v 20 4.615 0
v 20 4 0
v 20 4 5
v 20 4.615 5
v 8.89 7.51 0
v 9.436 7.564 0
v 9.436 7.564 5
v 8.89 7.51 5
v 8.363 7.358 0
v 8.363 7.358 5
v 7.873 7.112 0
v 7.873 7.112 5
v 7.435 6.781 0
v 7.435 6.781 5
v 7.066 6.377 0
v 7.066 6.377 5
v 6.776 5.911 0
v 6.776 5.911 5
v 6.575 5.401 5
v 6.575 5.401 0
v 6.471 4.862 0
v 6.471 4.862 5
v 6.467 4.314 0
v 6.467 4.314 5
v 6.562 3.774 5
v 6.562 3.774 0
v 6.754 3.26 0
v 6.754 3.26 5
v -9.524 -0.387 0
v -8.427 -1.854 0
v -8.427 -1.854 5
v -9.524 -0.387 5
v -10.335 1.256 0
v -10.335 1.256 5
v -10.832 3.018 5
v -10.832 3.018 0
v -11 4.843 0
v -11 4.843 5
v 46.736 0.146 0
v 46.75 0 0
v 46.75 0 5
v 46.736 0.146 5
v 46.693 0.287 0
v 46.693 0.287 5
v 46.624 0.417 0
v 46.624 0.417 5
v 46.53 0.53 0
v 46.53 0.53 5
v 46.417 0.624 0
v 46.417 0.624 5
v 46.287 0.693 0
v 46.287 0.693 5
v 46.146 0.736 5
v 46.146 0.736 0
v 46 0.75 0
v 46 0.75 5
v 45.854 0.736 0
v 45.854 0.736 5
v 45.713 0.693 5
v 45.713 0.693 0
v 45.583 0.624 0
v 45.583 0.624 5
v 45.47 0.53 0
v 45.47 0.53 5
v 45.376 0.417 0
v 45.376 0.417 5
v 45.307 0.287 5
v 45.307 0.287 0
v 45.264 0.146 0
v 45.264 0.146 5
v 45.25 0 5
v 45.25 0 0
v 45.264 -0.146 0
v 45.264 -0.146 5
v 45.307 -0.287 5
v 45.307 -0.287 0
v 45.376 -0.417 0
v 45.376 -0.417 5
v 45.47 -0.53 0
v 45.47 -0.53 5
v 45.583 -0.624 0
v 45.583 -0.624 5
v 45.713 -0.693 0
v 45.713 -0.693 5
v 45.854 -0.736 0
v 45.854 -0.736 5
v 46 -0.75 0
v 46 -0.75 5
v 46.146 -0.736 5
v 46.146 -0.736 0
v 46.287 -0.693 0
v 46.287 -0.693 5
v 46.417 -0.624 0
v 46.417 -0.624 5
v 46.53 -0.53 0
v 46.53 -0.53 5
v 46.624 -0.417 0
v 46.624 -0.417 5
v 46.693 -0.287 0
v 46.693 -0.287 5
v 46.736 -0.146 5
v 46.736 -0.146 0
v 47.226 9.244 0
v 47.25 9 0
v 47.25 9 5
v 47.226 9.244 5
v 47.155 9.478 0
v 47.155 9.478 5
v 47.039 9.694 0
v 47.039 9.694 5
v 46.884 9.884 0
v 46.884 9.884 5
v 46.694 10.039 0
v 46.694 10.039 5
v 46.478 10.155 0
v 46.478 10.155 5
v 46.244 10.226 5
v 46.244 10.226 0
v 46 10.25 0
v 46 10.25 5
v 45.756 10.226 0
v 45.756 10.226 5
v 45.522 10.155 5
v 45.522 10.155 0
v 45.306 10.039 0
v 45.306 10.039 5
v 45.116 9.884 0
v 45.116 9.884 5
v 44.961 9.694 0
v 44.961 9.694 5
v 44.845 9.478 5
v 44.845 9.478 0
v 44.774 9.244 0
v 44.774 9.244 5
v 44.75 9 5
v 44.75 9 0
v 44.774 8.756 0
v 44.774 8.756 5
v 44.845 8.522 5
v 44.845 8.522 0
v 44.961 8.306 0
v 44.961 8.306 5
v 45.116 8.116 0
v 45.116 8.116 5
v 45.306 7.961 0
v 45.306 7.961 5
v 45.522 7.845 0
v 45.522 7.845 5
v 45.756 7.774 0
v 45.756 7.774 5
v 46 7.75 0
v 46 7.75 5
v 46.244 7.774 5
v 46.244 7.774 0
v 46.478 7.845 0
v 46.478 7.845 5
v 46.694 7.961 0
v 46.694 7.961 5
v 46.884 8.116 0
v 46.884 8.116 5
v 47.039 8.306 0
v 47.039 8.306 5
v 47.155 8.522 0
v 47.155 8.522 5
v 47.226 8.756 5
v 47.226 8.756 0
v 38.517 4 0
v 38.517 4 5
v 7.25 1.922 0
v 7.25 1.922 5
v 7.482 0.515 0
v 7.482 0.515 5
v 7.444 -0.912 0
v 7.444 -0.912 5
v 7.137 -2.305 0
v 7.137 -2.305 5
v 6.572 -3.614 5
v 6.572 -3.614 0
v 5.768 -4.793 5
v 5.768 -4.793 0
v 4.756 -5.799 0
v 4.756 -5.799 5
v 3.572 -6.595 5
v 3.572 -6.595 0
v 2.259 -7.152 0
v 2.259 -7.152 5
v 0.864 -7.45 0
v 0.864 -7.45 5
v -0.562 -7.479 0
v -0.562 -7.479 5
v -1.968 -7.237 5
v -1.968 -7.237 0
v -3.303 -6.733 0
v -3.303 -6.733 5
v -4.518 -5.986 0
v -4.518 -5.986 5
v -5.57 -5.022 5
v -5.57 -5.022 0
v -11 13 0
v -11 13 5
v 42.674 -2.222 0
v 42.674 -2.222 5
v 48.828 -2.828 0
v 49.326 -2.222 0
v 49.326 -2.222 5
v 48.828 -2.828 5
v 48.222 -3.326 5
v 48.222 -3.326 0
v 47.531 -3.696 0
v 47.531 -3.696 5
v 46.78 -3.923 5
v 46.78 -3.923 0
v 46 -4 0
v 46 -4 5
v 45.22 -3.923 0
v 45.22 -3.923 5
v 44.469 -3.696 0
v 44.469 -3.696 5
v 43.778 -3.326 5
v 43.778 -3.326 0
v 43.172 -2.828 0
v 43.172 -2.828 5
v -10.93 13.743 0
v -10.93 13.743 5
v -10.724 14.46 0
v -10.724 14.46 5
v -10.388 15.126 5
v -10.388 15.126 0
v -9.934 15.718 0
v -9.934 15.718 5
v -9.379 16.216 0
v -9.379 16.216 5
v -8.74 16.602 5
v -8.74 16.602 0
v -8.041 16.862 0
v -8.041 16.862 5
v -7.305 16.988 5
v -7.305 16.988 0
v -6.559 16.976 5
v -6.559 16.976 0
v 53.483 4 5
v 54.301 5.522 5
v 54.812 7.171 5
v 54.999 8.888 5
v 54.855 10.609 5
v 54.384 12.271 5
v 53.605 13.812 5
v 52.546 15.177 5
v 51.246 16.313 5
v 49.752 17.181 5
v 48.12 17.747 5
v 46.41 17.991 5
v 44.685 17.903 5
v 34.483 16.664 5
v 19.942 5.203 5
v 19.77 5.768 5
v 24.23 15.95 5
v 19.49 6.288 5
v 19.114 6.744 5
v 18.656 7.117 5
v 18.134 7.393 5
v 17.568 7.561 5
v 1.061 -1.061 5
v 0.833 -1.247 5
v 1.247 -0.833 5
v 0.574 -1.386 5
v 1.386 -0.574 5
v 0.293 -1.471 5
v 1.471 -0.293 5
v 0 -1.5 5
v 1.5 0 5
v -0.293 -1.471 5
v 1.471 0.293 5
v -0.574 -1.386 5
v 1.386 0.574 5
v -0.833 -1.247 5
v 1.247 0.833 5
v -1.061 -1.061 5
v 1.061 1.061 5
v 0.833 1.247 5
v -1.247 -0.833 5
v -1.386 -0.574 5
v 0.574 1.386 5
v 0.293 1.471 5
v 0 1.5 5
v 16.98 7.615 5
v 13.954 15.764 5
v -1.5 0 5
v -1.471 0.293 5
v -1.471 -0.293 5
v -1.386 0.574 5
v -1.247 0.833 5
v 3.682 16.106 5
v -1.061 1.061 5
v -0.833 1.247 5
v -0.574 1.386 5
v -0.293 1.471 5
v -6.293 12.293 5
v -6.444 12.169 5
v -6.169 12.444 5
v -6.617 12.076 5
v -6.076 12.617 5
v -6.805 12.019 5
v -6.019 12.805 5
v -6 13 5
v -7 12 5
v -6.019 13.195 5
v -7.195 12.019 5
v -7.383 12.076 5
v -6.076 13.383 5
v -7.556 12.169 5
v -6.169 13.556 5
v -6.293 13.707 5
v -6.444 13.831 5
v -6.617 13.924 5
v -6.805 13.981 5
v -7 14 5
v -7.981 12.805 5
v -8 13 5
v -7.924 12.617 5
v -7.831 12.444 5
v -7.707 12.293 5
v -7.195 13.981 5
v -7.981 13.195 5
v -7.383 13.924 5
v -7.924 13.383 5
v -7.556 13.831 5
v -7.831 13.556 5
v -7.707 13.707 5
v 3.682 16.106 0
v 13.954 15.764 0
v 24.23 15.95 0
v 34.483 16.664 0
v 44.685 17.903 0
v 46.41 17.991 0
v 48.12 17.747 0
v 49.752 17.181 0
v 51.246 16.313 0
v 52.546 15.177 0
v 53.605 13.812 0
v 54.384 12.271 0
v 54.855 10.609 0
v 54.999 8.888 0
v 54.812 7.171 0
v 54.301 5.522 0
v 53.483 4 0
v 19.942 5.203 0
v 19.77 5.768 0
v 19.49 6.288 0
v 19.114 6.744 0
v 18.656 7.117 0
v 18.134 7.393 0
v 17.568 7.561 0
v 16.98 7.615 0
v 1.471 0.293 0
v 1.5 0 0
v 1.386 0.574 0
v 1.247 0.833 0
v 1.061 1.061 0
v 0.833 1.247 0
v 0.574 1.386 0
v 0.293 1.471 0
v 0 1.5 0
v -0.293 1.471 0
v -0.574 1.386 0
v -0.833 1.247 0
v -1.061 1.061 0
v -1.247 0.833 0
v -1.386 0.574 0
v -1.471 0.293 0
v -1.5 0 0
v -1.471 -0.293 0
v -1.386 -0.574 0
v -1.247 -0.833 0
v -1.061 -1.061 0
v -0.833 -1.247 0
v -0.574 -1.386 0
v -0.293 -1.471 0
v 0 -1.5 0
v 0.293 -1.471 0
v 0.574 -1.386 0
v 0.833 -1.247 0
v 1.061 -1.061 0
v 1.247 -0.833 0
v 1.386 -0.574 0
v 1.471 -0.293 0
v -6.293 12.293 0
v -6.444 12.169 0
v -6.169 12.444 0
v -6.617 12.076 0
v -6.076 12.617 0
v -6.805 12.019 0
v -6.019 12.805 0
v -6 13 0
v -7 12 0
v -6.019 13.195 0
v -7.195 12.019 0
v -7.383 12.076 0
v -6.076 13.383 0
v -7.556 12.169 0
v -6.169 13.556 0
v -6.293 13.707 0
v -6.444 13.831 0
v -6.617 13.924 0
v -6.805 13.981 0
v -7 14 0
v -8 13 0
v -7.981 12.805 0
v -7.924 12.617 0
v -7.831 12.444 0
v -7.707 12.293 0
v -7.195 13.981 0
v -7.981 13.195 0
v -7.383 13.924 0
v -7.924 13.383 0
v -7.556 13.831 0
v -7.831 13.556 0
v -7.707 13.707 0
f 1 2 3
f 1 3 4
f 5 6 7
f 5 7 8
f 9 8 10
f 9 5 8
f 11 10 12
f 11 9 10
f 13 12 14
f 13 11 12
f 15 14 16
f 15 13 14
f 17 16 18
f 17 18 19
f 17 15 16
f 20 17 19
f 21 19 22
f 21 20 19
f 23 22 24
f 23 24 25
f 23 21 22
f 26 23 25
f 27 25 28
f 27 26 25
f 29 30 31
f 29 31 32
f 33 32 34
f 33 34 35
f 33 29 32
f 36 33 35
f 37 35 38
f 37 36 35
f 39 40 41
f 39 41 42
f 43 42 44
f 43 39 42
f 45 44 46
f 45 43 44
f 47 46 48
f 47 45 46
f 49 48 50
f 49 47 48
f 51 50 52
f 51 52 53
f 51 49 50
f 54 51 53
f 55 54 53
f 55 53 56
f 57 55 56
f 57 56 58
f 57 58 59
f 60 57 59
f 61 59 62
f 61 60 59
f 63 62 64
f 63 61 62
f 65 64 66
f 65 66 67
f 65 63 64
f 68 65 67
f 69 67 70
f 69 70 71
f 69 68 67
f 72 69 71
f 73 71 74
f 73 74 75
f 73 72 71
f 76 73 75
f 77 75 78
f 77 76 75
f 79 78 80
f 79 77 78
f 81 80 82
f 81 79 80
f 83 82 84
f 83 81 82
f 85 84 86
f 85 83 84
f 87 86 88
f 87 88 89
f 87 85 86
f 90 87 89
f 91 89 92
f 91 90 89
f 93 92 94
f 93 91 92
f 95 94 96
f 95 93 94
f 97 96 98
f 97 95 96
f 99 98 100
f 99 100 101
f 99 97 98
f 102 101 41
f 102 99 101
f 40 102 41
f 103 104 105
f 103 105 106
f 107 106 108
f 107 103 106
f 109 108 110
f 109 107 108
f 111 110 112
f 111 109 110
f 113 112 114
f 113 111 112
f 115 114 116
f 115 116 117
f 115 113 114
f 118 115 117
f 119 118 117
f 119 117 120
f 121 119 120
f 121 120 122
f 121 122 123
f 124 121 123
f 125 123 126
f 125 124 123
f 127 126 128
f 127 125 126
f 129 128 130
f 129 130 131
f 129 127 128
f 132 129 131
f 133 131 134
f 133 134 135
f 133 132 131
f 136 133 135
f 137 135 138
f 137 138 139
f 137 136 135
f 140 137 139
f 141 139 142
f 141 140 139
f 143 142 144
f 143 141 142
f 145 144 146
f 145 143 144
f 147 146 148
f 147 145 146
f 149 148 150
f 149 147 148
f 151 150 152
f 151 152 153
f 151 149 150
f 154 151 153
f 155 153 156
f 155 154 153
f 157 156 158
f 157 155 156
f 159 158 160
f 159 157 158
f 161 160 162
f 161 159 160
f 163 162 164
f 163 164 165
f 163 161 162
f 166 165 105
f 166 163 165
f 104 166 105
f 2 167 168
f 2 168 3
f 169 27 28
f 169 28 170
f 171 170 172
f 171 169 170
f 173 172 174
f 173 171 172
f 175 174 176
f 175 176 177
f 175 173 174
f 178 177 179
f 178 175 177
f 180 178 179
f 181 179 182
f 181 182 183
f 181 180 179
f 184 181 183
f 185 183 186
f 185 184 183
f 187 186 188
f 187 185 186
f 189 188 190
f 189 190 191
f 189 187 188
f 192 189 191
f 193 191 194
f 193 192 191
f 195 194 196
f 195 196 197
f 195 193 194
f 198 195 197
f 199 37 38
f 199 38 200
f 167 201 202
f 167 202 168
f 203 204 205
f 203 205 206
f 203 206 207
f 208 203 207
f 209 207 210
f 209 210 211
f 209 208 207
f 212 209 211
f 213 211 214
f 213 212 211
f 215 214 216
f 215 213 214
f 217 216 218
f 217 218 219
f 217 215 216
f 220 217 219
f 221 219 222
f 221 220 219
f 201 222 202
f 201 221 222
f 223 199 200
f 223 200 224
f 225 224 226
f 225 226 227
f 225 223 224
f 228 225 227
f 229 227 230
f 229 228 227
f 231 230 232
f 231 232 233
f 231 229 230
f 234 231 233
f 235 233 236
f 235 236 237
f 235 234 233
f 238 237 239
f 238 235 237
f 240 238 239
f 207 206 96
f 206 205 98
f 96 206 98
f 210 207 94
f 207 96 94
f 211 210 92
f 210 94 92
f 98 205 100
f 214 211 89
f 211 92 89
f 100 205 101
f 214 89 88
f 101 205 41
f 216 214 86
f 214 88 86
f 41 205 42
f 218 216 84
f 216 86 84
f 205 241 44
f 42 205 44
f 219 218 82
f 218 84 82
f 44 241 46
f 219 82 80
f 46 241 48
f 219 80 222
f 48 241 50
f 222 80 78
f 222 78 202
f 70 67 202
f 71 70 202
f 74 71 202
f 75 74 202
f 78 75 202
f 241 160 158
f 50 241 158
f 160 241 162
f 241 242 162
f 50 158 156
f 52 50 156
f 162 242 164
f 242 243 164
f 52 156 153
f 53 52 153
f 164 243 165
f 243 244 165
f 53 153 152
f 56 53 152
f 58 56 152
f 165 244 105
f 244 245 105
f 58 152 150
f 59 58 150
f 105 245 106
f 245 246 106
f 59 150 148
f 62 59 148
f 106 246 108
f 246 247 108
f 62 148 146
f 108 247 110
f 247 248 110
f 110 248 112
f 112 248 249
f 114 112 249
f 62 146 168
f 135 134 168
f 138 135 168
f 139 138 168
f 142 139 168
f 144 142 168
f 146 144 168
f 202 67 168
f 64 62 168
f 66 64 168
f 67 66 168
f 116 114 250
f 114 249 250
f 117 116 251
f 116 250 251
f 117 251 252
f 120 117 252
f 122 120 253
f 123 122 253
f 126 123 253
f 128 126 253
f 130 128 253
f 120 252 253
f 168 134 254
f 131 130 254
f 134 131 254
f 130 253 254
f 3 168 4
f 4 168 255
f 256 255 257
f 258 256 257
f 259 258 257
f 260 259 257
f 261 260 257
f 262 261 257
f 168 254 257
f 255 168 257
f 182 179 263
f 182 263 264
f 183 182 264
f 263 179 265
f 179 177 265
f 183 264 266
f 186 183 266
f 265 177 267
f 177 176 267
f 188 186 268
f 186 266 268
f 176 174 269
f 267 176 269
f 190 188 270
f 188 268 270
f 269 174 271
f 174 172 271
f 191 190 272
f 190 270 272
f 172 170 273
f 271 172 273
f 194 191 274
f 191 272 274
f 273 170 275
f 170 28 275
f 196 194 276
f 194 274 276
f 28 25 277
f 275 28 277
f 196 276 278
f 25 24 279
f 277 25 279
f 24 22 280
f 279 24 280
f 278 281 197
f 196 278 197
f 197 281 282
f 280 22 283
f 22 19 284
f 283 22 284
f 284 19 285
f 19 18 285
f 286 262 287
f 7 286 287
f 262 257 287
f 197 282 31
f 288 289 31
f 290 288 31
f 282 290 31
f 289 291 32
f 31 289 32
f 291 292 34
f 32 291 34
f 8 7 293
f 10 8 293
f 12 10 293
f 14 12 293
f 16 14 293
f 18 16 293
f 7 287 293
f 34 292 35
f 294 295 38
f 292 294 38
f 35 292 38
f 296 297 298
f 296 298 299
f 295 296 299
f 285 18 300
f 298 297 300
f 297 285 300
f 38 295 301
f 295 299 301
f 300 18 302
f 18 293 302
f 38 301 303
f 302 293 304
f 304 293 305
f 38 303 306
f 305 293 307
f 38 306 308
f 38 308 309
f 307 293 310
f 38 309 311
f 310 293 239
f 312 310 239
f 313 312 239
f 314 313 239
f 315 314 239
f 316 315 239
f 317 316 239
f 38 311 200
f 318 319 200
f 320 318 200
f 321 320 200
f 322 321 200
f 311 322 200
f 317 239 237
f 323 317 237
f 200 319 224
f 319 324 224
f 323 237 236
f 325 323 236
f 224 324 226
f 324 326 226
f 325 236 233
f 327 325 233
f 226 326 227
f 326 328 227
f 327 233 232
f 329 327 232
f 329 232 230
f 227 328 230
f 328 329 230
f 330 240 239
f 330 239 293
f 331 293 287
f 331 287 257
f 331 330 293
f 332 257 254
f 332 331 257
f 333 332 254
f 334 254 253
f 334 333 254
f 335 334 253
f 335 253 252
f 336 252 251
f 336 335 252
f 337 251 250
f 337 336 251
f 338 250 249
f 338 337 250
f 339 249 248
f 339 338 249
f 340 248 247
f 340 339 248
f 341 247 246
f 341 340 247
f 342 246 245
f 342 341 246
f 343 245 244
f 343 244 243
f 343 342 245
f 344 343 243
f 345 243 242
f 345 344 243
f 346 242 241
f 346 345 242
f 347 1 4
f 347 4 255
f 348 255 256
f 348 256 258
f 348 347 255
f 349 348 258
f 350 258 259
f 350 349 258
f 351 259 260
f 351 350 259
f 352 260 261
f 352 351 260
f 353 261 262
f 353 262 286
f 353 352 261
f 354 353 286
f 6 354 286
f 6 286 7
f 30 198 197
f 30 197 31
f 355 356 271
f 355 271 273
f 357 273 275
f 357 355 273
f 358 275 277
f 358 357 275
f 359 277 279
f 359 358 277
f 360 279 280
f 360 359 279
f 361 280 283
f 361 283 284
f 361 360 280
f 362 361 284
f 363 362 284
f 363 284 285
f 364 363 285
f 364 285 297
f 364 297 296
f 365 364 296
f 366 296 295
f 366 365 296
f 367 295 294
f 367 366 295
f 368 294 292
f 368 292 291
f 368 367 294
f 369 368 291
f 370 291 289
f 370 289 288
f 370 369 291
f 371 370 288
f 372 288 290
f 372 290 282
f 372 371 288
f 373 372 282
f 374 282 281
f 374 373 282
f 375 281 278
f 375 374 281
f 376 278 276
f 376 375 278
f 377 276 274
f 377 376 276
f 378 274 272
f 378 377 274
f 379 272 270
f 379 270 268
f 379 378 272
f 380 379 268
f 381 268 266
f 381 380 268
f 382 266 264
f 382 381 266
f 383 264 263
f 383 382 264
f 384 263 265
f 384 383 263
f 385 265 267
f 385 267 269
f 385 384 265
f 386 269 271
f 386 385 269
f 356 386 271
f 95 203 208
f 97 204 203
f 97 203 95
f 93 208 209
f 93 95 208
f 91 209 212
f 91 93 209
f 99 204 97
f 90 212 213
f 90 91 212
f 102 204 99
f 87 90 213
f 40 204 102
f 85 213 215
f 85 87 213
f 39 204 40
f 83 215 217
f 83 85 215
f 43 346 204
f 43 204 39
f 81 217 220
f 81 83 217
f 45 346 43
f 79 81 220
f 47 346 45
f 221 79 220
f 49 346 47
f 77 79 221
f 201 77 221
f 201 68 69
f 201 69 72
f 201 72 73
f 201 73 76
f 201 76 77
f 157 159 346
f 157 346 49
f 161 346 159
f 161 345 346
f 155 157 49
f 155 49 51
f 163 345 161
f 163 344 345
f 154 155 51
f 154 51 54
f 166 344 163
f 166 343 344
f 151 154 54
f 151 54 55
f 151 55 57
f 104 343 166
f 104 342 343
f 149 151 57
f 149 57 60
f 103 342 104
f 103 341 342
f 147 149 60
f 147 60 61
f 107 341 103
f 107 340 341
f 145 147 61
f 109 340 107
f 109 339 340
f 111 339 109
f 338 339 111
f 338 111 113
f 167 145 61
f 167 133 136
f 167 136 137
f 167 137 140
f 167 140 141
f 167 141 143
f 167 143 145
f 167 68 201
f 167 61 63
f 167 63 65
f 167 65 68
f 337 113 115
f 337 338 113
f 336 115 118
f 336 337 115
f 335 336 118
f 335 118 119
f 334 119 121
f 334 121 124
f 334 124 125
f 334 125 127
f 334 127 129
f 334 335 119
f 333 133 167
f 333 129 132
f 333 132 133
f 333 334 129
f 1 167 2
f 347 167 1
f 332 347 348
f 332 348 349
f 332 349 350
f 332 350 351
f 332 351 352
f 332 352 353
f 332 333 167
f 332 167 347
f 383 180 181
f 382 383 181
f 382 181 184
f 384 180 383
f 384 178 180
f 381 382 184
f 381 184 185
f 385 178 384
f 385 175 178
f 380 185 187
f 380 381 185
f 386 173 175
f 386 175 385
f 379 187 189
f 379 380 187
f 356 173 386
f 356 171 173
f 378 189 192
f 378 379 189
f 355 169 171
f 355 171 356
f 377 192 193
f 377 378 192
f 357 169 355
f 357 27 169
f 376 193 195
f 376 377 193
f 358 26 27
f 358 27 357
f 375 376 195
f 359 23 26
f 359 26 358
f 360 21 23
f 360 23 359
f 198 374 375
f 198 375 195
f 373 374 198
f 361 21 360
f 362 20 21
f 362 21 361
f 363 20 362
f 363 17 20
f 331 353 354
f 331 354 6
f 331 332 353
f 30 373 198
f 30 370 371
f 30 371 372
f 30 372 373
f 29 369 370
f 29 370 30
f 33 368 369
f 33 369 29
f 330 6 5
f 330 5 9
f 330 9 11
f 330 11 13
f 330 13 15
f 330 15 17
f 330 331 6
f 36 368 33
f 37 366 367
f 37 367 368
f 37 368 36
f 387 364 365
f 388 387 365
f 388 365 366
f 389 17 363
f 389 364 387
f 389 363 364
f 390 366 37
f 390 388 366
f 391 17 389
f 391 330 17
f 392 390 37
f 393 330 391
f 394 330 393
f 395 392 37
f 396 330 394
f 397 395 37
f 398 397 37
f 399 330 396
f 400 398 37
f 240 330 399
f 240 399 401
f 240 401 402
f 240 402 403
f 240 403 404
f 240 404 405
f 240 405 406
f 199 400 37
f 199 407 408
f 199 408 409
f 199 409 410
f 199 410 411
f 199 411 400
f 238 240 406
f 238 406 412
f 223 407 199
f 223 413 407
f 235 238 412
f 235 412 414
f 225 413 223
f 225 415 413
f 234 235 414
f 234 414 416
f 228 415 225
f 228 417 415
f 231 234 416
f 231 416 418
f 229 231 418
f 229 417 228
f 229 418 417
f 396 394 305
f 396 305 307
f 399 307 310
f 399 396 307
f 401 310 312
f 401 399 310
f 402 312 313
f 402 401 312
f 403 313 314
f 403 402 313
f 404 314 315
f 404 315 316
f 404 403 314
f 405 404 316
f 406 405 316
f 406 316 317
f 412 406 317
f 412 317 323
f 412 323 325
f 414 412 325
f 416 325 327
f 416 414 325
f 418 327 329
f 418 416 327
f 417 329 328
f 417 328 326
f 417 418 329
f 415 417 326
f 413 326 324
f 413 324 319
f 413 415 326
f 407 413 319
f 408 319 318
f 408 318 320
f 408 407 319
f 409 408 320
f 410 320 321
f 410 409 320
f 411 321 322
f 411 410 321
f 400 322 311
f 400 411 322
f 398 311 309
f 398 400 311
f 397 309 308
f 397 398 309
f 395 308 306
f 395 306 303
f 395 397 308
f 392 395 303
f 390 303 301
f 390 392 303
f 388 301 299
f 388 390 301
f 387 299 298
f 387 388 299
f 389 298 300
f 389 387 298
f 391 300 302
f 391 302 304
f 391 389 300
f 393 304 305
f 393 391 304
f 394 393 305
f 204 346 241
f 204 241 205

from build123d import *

# Parameters (mm, degrees)
SKETCH1_R           = 1.5
SKETCH1_R_2         = 0.75
SKETCH1_R_3         = 1.25
SKETCH1_R_4         = 1
BOSS_EXTRUDE1_DEPTH = 5


with BuildPart() as part:
    # Sketch1 → Boss-Extrude1 (new body)
    with BuildSketch(Plane.XY):
        with BuildLine():
            Line((53.483314774, 4), (49.325917677, -2.222222222))
            ThreePointArc((49.325917677, -2.222222222), (46, -4), (42.674082323, -2.222222222))
            Line((42.674082323, -2.222222222), (38.516685226, 4))
            Line((38.516685226, 4), (20, 4))
            Line((20, 4), (20, 4.615103075))
            ThreePointArc((20, 4.615103075), (19.114133272, 6.743586222), (16.979706327, 7.615034435))
            Line((16.979706327, 7.615034435), (9.43588174, 7.56400263))
            ThreePointArc((9.43588174, 7.56400263), (6.909923235, 6.150450748), (6.754411009, 3.260050907))
            ThreePointArc((6.754411009, 3.260050907), (4.183258191, -6.224977984), (-5.570203117, -5.022234287))
            Line((-5.570203117, -5.022234287), (-8.426937489, -1.853805696))
            ThreePointArc((-8.426937489, -1.853805696), (-10.334596266, 1.25568183), (-11, 4.842506687))
            Line((-11, 4.842506687), (-11, 13))
            ThreePointArc((-11, 13), (-9.66809518, 15.980145652), (-6.559365945, 16.975656126))
            ThreePointArc((-6.559365945, 16.975656126), (19.092866868, 15.791235692), (44.685411632, 17.903474458))
            ThreePointArc((44.685411632, 17.903474458), (53.605257844, 13.812489287), (53.483314774, 4))
        make_face()
        Circle(SKETCH1_R, mode=Mode.SUBTRACT)
        with Locations((46, 0)):
            Circle(SKETCH1_R_2, mode=Mode.SUBTRACT)
        with Locations((46, 9)):
            Circle(SKETCH1_R_3, mode=Mode.SUBTRACT)
        with Locations((-7, 13)):
            Circle(SKETCH1_R_4, mode=Mode.SUBTRACT)
    extrude(amount=BOSS_EXTRUDE1_DEPTH)


solid = part.part
